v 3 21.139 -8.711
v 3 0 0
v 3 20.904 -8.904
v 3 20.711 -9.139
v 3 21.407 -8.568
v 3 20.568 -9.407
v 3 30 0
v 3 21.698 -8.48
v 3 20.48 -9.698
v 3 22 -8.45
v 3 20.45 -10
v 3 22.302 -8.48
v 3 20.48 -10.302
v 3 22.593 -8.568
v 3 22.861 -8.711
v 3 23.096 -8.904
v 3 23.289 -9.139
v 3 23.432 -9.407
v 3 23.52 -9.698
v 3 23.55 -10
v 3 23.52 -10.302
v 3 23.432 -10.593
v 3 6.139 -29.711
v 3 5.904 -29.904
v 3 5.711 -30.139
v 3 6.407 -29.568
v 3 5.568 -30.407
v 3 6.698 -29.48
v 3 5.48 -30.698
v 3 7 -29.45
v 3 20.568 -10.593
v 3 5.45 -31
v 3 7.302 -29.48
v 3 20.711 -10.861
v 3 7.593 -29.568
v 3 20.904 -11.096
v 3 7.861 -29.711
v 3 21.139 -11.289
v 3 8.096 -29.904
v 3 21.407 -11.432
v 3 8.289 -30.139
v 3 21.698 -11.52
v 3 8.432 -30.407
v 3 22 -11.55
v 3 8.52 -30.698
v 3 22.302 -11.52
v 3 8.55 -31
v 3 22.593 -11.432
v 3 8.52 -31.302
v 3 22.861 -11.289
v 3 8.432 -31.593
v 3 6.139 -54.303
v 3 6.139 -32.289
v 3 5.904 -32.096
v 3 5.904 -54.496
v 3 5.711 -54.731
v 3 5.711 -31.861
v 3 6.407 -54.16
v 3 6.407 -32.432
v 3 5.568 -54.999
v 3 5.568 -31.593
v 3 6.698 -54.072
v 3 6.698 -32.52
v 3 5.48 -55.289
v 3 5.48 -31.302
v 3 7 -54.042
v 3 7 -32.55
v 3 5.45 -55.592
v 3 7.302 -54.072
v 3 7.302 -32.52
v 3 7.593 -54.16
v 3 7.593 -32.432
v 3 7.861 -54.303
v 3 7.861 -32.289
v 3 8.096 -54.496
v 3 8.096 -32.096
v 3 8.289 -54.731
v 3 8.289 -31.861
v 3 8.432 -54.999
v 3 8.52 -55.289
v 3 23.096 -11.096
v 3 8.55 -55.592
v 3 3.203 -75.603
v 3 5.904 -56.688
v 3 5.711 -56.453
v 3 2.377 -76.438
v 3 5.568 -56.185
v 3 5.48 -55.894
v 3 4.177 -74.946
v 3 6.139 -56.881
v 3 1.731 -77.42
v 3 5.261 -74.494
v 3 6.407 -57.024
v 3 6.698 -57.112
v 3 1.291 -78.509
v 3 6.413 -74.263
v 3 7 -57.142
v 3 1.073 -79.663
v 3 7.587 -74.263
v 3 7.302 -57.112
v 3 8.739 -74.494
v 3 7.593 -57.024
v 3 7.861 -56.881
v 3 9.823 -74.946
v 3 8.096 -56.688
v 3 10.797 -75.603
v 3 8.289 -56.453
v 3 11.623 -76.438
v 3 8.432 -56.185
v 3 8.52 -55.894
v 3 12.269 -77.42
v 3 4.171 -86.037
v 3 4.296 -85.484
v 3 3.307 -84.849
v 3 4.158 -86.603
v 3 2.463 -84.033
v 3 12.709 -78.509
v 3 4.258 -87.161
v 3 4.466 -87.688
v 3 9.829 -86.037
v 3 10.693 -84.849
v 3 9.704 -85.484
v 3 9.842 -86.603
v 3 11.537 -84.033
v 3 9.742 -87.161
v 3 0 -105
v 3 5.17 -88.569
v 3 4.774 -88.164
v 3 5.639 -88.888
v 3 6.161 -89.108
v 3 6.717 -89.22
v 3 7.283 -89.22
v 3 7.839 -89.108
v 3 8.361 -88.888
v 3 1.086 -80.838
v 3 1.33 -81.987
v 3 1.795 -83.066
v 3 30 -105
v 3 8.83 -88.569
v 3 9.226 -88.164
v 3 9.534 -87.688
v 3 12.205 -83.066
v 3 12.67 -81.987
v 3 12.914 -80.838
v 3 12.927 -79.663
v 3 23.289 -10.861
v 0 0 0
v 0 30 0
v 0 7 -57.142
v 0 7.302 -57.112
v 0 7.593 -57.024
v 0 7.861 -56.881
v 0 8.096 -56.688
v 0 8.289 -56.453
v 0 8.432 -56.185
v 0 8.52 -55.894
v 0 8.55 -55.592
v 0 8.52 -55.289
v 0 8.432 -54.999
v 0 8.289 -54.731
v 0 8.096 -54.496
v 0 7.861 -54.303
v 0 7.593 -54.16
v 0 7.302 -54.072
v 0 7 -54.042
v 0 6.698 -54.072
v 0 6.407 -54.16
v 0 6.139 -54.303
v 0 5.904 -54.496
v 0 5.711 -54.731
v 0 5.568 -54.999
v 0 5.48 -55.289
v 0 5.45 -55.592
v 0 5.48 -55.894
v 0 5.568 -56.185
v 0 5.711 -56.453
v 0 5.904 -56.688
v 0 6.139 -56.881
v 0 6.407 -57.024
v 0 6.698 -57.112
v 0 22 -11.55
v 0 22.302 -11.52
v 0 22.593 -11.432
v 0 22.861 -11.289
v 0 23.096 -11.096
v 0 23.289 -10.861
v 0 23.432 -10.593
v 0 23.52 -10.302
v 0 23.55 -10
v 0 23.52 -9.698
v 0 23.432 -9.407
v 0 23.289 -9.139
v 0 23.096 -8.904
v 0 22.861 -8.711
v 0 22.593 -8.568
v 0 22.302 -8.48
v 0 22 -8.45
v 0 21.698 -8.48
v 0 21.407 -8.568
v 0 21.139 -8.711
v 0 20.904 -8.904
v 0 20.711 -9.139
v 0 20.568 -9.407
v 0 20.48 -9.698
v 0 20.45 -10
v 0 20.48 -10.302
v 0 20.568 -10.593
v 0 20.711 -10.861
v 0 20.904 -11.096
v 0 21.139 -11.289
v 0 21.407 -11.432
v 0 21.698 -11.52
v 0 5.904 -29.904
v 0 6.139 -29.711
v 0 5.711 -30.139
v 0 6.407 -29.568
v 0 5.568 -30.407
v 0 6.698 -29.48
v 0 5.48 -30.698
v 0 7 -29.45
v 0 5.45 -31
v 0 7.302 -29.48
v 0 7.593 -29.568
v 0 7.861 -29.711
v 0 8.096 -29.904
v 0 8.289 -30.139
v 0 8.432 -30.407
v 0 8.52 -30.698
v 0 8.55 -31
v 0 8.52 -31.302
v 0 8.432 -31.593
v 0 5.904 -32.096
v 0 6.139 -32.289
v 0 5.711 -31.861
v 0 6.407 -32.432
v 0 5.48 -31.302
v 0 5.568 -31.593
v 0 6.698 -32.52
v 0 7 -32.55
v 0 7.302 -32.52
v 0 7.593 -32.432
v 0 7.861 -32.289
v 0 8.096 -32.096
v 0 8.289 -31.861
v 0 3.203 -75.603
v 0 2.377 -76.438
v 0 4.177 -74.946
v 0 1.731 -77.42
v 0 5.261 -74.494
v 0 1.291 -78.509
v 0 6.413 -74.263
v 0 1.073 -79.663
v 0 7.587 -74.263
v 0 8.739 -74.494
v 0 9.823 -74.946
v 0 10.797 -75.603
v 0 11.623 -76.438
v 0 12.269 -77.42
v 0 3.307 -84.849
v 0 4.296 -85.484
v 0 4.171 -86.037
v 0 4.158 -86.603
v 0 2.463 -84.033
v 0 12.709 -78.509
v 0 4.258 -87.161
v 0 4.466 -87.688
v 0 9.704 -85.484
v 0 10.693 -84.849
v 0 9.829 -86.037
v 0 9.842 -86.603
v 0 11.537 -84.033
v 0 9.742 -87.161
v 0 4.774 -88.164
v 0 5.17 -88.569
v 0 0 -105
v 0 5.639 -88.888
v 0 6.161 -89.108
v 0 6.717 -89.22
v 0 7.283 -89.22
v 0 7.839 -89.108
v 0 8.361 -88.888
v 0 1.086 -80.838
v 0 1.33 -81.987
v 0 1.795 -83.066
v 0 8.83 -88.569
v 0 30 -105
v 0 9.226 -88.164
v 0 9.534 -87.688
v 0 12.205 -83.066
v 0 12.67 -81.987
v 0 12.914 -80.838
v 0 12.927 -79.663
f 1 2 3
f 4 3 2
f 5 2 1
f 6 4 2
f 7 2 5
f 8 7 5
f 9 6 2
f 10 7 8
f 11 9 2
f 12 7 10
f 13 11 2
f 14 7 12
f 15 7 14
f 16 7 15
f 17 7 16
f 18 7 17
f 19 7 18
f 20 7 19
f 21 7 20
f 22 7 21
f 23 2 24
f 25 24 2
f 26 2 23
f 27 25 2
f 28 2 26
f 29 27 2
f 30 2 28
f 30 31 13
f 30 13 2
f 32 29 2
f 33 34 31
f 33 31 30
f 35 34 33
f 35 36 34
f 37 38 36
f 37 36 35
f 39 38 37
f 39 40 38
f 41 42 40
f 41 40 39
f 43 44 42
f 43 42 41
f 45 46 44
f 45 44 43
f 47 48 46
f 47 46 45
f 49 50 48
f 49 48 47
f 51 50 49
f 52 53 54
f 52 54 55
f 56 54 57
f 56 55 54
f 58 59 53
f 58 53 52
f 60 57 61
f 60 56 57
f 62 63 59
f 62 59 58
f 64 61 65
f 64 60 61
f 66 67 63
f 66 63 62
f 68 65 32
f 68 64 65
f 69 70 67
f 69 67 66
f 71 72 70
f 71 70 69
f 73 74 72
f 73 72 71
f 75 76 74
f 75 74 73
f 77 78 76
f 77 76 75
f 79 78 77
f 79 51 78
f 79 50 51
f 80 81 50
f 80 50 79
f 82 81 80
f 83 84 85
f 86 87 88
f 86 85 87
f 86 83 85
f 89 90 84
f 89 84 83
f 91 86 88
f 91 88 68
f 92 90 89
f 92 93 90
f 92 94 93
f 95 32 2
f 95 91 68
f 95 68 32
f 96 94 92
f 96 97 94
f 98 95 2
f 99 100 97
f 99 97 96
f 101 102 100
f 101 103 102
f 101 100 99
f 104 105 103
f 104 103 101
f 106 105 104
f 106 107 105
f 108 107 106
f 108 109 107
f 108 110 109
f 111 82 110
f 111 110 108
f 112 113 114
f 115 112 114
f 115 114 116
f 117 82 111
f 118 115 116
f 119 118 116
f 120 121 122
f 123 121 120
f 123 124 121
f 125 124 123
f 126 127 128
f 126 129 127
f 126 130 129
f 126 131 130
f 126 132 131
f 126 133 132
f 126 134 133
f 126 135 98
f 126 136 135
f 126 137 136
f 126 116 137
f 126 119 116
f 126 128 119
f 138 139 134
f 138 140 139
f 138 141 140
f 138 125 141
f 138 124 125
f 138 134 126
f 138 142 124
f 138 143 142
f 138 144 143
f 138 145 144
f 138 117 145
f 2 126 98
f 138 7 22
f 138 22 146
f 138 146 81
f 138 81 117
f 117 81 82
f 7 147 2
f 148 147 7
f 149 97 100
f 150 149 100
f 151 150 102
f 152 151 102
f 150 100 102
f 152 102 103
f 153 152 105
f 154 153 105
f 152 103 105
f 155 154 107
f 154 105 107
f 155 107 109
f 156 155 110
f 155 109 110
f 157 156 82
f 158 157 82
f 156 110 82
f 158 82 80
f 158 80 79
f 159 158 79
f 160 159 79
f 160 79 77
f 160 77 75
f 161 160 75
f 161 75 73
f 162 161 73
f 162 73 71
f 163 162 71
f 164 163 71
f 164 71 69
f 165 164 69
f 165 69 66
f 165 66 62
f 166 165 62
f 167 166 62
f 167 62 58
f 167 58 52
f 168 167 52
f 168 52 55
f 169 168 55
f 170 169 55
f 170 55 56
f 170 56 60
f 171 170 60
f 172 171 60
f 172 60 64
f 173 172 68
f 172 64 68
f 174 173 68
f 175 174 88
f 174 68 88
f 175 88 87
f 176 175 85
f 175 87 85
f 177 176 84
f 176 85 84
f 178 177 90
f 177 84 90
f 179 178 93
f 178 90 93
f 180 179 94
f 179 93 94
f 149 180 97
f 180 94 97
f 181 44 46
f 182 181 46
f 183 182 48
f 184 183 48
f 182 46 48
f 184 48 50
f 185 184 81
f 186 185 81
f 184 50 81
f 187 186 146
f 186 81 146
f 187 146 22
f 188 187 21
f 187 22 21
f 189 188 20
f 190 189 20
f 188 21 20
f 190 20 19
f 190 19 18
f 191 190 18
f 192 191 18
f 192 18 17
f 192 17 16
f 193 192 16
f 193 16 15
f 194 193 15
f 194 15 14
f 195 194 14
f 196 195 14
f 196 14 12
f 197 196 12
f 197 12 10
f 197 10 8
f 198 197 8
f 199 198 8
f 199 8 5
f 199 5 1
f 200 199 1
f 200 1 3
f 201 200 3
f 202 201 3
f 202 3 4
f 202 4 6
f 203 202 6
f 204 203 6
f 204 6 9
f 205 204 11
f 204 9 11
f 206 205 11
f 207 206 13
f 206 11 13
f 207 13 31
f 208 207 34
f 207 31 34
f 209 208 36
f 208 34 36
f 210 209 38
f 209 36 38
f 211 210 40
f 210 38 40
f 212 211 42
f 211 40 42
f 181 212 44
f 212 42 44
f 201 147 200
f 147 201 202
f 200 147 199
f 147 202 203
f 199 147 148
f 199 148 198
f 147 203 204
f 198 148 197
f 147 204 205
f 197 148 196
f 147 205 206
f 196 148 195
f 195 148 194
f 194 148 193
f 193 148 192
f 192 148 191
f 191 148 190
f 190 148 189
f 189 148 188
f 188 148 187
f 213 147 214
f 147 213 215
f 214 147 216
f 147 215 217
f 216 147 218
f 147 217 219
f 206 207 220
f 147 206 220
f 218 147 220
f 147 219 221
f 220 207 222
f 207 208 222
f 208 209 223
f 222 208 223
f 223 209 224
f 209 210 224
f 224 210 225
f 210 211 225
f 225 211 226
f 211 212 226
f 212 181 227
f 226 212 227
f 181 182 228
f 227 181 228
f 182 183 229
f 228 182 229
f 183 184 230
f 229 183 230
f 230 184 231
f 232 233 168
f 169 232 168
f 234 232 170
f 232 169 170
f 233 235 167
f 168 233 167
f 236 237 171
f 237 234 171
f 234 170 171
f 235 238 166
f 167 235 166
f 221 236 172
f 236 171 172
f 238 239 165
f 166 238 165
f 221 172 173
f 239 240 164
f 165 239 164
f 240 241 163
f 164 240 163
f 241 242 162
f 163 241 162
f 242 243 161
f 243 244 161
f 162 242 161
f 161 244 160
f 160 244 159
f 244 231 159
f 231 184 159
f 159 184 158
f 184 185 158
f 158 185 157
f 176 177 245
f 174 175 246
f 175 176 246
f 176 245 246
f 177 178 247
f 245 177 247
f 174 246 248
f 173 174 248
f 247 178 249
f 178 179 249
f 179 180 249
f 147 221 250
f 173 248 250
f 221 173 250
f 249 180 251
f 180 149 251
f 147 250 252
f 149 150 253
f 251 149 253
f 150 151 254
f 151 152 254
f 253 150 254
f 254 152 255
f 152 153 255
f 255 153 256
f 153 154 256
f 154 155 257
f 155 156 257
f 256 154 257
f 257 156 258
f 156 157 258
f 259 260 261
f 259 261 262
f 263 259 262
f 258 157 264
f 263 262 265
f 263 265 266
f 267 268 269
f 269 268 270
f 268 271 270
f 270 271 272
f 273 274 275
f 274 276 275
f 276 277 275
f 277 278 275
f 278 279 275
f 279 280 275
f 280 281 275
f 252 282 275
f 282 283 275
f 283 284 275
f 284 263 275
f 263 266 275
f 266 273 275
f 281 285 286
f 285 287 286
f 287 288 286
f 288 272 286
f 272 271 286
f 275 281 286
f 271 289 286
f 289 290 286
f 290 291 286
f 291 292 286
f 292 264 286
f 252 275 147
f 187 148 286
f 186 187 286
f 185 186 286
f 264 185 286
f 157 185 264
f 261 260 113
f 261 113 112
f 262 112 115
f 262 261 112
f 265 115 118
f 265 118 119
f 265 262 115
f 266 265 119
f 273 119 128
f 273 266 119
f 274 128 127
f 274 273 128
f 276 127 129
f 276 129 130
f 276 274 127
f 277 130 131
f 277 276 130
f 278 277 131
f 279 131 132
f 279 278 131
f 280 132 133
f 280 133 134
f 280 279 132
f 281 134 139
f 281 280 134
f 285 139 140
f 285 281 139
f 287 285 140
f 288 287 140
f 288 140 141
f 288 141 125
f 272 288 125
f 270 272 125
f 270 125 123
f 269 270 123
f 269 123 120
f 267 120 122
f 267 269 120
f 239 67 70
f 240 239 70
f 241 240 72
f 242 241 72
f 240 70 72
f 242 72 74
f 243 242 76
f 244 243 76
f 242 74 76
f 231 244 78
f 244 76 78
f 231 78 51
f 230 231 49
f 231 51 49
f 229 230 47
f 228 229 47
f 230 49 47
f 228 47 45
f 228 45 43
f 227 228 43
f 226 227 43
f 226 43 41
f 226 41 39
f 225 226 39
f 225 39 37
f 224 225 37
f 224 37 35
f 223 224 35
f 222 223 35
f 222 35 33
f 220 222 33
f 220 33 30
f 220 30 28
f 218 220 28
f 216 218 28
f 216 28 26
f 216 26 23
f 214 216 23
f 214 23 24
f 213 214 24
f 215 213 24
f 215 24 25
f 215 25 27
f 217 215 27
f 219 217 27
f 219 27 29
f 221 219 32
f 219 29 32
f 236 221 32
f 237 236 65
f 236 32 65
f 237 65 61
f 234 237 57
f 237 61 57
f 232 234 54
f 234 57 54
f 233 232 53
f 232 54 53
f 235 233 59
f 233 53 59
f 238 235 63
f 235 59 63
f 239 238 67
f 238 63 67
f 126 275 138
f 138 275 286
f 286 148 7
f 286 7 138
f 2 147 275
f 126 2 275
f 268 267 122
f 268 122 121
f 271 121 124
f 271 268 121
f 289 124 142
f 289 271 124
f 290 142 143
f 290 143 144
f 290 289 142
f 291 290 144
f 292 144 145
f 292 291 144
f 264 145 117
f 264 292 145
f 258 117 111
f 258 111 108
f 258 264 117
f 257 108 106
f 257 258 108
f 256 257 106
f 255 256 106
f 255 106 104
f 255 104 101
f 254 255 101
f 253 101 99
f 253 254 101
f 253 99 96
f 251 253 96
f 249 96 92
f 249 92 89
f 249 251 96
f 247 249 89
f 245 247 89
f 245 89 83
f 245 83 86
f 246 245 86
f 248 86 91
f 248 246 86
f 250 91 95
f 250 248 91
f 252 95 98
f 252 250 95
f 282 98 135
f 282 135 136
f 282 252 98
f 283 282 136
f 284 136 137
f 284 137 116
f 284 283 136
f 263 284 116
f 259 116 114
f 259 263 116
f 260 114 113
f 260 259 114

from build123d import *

# Parameters (mm, degrees)
SKIZZE1_W                       = 105
SKIZZE1_H                       = 30
AUFSATZ_LINEAR_AUSTRAGEN1_DEPTH = 3
SKIZZE2_R                       = 1.55
BOHRUNGEN_DEPTH                 = 110.242848736
SCHNITT_LINEAR_AUSTRAGEN4_DEPTH = 3


with BuildPart() as part:
    # Skizze1 → Aufsatz-Linear austragen1 (new body)
    with BuildSketch(Plane(origin=(0, 0, 0), x_dir=(0, 0, -1), z_dir=(1, 0, 0))):
        with Locations((52.5, 15)):
            Rectangle(SKIZZE1_W, SKIZZE1_H)
    extrude(amount=AUFSATZ_LINEAR_AUSTRAGEN1_DEPTH)

    # Skizze2 → Bohrungen (cut, through all)
    with BuildSketch(Plane(origin=(3, 0, 0), x_dir=(0, 0, -1), z_dir=(1, 0, 0))):
        with Locations((10, 22)):
            Circle(SKIZZE2_R)
        with Locations((31, 7)):
            Circle(SKIZZE2_R)
        with Locations((55.59187467, 7)):
            Circle(SKIZZE2_R)
        with Locations((80.183749339, 7)):
            Circle(SKIZZE2_R)
    extrude(amount=-BOHRUNGEN_DEPTH, mode=Mode.SUBTRACT)

    # Skizze7 → Schnitt-Linear austragen4 (cut)
    with BuildSketch(Plane(origin=(0, 0, 0), x_dir=(0, 0, -1), z_dir=(1, 0, 0))):
        with BuildLine():
            ThreePointArc((85.483749339, 9.704163457), (74.233749339, 7), (85.483749339, 4.295836543))
            ThreePointArc((85.483749339, 4.295836543), (89.233749339, 7), (85.483749339, 9.704163457))
        make_face()
    extrude(amount=SCHNITT_LINEAR_AUSTRAGEN4_DEPTH, mode=Mode.SUBTRACT)


solid = part.part
